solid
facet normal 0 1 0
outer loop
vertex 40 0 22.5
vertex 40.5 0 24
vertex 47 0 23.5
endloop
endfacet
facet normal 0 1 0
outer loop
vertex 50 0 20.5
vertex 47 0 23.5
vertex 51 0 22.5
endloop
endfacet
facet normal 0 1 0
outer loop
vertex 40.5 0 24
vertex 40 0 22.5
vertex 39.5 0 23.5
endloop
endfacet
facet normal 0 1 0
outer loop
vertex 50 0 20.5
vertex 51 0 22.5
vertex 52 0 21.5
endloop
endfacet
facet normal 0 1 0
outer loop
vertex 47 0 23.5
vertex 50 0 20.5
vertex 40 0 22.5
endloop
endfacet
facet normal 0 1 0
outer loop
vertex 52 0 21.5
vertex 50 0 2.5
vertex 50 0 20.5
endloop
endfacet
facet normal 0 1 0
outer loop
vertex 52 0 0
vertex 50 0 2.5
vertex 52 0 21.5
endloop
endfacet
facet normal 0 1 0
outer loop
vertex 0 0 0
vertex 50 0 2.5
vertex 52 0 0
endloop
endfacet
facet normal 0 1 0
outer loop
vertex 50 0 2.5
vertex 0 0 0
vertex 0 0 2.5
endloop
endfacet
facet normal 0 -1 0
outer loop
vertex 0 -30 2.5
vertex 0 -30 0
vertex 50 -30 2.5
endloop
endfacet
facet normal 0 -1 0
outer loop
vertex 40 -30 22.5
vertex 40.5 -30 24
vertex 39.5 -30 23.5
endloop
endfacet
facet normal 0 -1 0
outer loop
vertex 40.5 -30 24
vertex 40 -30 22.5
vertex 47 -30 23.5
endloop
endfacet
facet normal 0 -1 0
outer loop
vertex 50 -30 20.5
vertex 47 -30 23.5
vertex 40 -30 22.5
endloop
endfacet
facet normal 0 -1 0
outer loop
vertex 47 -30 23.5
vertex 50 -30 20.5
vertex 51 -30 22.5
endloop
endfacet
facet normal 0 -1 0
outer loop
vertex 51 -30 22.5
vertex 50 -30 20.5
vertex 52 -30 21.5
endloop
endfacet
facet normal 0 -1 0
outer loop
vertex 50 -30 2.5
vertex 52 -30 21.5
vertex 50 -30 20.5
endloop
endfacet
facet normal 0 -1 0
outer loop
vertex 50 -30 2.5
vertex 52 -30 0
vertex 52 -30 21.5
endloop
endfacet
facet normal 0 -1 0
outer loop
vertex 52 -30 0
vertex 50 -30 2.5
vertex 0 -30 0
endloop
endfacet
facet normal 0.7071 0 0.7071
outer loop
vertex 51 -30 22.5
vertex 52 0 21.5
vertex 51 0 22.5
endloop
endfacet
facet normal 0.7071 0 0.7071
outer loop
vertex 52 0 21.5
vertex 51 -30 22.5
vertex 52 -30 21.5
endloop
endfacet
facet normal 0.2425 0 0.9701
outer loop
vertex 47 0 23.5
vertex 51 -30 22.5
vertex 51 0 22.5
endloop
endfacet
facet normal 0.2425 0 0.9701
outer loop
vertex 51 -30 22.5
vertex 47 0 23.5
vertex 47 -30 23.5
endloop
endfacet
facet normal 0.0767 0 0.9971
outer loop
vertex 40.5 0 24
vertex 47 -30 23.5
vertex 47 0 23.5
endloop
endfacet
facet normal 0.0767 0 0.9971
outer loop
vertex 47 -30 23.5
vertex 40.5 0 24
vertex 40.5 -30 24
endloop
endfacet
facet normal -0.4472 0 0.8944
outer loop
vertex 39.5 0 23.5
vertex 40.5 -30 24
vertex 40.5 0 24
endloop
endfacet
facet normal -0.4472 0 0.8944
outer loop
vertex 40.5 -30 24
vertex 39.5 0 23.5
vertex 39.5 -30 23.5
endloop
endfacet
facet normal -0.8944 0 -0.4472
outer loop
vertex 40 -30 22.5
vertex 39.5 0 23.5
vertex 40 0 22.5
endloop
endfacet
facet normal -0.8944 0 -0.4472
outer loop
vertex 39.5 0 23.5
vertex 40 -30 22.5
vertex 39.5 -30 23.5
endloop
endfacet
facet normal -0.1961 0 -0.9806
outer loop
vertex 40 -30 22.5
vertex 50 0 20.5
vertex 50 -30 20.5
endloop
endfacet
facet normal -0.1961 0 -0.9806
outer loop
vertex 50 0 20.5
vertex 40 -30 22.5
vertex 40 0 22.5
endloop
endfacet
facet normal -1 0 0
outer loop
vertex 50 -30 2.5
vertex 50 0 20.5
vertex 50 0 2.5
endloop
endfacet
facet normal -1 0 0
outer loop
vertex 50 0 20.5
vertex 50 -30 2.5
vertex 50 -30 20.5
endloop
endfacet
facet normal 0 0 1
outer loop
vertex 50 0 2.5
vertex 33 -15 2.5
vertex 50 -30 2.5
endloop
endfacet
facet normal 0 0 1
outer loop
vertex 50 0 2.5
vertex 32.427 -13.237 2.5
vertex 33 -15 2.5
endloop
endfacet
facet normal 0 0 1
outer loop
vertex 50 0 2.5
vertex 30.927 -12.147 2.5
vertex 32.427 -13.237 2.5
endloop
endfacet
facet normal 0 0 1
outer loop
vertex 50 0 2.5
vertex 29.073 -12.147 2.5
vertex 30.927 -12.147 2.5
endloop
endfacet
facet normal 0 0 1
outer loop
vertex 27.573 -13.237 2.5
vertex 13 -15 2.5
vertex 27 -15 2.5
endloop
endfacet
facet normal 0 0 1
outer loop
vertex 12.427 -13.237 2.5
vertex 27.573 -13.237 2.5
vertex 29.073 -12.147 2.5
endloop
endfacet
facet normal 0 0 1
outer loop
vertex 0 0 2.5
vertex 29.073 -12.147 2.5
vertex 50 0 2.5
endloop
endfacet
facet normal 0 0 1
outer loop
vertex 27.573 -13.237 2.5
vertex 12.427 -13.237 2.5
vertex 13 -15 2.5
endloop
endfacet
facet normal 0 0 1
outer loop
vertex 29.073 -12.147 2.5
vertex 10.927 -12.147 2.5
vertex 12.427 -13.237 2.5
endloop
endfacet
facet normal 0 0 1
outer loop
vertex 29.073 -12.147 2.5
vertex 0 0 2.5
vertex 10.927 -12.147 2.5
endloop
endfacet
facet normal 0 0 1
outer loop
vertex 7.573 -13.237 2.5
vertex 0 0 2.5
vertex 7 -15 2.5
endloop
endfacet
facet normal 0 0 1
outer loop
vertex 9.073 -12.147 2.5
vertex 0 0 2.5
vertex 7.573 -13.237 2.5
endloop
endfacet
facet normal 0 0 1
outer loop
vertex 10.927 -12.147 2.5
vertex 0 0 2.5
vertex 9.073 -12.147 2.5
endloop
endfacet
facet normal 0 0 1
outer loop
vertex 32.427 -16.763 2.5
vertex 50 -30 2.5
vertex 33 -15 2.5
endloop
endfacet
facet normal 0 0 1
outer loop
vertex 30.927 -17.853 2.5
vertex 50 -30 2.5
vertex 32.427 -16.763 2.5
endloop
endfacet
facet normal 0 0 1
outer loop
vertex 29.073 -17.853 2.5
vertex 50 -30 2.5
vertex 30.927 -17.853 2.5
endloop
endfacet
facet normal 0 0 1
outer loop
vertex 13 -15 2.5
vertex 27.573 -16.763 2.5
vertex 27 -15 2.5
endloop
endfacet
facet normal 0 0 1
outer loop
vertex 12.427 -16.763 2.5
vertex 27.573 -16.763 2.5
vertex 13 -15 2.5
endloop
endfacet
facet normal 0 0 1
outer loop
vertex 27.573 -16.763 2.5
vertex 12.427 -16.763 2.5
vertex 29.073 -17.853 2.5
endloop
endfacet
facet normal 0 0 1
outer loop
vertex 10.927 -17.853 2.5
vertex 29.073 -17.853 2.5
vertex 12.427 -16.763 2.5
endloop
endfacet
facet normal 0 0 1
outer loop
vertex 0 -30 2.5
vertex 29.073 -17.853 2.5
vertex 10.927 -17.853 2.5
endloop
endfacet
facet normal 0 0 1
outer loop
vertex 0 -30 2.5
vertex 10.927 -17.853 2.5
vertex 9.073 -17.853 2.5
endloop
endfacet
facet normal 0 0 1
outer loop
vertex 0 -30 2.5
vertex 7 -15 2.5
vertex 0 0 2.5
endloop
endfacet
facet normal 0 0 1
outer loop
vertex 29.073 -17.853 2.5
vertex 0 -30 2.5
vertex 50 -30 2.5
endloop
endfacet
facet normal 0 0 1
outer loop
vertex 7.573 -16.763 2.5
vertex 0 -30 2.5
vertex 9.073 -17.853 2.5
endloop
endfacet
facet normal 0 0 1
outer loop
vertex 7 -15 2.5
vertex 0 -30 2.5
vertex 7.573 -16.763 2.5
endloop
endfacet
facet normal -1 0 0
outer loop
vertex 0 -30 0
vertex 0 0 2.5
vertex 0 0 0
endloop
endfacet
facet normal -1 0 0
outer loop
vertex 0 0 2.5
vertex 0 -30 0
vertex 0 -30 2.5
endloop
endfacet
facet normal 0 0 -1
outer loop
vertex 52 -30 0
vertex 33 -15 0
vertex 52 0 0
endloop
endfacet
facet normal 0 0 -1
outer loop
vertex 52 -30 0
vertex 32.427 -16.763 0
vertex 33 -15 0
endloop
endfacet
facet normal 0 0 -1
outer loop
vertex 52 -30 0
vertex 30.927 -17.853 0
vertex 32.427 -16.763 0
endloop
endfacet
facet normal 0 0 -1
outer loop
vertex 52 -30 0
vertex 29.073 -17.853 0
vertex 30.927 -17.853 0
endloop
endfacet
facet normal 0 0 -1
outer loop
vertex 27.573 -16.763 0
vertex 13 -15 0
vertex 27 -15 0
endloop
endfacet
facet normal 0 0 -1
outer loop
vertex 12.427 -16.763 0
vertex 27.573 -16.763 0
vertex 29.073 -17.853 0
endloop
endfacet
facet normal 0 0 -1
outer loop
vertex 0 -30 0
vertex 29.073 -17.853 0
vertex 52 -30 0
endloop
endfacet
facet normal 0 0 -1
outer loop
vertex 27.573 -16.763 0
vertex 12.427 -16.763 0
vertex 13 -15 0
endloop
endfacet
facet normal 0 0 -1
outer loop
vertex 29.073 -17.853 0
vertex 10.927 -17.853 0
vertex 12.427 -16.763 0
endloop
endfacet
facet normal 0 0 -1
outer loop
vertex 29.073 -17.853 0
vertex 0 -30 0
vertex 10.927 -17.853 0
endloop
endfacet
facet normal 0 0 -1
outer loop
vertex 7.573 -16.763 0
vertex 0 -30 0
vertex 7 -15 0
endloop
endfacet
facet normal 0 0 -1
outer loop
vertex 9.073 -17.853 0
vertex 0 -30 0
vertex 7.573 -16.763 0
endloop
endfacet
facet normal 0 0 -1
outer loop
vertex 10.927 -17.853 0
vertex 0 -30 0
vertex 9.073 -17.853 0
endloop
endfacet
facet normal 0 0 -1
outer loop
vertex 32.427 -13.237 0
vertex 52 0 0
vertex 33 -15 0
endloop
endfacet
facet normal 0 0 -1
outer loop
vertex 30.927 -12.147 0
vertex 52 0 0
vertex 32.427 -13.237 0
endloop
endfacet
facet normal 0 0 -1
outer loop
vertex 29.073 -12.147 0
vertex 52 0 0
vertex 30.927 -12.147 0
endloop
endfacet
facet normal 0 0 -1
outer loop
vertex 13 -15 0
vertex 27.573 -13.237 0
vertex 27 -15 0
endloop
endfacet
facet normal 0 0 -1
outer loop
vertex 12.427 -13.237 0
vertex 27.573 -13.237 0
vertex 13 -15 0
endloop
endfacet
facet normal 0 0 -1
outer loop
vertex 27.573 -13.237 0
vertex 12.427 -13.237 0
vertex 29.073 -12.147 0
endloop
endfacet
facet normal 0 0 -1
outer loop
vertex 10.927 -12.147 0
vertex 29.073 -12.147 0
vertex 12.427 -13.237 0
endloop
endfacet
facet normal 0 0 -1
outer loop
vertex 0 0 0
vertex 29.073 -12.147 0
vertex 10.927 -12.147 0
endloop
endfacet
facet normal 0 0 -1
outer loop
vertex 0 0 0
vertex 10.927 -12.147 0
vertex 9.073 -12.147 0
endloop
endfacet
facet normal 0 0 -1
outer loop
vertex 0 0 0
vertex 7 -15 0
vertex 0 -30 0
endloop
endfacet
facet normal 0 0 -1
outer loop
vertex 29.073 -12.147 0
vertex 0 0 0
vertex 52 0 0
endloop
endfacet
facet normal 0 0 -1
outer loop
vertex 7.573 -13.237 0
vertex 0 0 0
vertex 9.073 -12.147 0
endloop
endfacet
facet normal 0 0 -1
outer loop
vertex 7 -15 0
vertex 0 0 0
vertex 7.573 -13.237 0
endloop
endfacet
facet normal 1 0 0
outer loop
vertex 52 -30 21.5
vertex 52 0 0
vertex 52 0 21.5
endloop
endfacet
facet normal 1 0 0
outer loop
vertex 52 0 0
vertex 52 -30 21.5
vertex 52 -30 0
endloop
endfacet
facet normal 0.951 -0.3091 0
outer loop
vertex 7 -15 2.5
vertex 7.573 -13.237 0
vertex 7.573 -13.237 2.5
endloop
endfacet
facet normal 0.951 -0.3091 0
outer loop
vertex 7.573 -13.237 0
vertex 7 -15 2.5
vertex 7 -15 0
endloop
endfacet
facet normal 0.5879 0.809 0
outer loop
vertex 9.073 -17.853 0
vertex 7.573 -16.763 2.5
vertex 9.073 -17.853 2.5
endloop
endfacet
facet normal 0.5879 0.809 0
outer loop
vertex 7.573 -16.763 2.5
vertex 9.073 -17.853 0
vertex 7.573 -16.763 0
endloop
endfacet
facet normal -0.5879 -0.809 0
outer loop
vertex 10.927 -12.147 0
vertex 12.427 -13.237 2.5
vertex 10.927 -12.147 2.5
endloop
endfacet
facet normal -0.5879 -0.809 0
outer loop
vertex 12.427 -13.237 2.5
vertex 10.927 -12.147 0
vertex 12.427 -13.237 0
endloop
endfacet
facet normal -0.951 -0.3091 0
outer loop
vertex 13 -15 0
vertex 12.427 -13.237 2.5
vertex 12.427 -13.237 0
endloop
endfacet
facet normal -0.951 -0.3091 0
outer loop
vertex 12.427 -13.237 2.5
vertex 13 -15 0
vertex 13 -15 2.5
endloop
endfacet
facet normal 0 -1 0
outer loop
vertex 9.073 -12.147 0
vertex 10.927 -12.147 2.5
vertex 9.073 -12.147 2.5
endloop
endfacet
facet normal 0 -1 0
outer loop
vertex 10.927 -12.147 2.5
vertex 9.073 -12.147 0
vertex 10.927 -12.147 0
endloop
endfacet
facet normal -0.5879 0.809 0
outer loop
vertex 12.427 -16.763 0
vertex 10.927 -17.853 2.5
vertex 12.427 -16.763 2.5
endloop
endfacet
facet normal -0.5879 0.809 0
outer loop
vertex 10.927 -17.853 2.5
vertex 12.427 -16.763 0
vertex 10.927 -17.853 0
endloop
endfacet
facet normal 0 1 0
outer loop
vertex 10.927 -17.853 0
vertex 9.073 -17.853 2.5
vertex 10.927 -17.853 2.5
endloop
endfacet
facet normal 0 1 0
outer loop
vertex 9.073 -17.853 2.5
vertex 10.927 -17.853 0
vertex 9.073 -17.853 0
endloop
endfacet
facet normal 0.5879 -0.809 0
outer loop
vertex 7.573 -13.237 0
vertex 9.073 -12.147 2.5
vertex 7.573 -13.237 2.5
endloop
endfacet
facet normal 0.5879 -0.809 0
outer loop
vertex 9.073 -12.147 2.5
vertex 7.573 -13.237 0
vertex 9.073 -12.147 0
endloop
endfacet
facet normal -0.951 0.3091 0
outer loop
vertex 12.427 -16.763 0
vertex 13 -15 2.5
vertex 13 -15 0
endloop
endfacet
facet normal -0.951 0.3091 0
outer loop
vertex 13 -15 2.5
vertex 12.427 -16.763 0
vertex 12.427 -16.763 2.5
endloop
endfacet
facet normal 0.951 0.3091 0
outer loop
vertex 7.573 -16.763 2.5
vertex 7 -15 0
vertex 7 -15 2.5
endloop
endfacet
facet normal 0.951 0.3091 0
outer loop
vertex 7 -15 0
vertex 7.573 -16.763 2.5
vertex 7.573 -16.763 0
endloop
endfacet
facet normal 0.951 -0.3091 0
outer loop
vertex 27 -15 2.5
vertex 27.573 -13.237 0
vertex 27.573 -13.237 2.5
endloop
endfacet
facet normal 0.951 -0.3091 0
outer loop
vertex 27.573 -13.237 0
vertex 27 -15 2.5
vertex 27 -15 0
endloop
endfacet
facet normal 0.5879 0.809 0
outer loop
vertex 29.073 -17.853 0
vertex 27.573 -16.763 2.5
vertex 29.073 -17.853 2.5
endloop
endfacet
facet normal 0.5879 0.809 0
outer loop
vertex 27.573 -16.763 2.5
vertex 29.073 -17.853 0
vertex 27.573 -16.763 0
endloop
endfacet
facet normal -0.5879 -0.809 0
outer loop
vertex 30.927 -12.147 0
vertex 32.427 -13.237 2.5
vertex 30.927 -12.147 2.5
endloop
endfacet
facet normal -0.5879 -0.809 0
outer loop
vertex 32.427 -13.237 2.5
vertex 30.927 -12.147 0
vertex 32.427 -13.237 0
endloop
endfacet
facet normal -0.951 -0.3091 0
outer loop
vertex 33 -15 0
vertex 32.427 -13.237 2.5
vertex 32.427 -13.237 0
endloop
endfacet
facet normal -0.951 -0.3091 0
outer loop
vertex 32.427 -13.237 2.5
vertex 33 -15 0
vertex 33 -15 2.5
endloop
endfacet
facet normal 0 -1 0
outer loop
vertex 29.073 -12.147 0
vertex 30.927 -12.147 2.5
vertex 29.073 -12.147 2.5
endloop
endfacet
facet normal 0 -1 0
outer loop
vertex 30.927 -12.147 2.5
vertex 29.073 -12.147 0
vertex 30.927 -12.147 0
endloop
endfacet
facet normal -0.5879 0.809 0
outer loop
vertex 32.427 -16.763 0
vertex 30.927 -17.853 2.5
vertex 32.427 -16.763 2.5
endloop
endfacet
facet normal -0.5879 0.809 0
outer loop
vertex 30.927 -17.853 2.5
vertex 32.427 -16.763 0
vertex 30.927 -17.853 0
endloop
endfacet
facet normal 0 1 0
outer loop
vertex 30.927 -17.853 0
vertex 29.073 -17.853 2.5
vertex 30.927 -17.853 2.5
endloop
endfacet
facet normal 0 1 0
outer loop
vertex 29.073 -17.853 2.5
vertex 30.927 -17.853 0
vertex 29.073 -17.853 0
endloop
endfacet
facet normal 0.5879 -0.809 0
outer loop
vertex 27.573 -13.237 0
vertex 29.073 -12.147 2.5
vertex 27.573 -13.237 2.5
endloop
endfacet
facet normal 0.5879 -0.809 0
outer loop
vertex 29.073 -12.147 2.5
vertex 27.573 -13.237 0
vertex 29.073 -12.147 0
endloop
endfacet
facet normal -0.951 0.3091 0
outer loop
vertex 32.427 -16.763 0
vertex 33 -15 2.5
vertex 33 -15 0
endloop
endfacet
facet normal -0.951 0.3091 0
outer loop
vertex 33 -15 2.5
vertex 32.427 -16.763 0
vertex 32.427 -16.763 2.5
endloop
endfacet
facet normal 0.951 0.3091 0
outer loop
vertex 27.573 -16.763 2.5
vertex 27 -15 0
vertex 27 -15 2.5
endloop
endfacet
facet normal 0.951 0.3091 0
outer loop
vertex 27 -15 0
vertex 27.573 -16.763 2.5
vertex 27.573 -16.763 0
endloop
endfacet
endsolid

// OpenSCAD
difference() {
    rotate([90,0,0])
    linear_extrude(30)
    polygon([[0,0],[0,2.5],[50,2.5],[50,20.5],[40,22.5],[39.5,23.5],[40.5,24],[47,23.5],[51,22.5],[52,21.5],[52,0]]);    

    
    translate([10,-15,-1])
    cylinder(r=3,h=4);

    translate([30,-15,-1])
    cylinder(r=3,h=4);
    
    
}
